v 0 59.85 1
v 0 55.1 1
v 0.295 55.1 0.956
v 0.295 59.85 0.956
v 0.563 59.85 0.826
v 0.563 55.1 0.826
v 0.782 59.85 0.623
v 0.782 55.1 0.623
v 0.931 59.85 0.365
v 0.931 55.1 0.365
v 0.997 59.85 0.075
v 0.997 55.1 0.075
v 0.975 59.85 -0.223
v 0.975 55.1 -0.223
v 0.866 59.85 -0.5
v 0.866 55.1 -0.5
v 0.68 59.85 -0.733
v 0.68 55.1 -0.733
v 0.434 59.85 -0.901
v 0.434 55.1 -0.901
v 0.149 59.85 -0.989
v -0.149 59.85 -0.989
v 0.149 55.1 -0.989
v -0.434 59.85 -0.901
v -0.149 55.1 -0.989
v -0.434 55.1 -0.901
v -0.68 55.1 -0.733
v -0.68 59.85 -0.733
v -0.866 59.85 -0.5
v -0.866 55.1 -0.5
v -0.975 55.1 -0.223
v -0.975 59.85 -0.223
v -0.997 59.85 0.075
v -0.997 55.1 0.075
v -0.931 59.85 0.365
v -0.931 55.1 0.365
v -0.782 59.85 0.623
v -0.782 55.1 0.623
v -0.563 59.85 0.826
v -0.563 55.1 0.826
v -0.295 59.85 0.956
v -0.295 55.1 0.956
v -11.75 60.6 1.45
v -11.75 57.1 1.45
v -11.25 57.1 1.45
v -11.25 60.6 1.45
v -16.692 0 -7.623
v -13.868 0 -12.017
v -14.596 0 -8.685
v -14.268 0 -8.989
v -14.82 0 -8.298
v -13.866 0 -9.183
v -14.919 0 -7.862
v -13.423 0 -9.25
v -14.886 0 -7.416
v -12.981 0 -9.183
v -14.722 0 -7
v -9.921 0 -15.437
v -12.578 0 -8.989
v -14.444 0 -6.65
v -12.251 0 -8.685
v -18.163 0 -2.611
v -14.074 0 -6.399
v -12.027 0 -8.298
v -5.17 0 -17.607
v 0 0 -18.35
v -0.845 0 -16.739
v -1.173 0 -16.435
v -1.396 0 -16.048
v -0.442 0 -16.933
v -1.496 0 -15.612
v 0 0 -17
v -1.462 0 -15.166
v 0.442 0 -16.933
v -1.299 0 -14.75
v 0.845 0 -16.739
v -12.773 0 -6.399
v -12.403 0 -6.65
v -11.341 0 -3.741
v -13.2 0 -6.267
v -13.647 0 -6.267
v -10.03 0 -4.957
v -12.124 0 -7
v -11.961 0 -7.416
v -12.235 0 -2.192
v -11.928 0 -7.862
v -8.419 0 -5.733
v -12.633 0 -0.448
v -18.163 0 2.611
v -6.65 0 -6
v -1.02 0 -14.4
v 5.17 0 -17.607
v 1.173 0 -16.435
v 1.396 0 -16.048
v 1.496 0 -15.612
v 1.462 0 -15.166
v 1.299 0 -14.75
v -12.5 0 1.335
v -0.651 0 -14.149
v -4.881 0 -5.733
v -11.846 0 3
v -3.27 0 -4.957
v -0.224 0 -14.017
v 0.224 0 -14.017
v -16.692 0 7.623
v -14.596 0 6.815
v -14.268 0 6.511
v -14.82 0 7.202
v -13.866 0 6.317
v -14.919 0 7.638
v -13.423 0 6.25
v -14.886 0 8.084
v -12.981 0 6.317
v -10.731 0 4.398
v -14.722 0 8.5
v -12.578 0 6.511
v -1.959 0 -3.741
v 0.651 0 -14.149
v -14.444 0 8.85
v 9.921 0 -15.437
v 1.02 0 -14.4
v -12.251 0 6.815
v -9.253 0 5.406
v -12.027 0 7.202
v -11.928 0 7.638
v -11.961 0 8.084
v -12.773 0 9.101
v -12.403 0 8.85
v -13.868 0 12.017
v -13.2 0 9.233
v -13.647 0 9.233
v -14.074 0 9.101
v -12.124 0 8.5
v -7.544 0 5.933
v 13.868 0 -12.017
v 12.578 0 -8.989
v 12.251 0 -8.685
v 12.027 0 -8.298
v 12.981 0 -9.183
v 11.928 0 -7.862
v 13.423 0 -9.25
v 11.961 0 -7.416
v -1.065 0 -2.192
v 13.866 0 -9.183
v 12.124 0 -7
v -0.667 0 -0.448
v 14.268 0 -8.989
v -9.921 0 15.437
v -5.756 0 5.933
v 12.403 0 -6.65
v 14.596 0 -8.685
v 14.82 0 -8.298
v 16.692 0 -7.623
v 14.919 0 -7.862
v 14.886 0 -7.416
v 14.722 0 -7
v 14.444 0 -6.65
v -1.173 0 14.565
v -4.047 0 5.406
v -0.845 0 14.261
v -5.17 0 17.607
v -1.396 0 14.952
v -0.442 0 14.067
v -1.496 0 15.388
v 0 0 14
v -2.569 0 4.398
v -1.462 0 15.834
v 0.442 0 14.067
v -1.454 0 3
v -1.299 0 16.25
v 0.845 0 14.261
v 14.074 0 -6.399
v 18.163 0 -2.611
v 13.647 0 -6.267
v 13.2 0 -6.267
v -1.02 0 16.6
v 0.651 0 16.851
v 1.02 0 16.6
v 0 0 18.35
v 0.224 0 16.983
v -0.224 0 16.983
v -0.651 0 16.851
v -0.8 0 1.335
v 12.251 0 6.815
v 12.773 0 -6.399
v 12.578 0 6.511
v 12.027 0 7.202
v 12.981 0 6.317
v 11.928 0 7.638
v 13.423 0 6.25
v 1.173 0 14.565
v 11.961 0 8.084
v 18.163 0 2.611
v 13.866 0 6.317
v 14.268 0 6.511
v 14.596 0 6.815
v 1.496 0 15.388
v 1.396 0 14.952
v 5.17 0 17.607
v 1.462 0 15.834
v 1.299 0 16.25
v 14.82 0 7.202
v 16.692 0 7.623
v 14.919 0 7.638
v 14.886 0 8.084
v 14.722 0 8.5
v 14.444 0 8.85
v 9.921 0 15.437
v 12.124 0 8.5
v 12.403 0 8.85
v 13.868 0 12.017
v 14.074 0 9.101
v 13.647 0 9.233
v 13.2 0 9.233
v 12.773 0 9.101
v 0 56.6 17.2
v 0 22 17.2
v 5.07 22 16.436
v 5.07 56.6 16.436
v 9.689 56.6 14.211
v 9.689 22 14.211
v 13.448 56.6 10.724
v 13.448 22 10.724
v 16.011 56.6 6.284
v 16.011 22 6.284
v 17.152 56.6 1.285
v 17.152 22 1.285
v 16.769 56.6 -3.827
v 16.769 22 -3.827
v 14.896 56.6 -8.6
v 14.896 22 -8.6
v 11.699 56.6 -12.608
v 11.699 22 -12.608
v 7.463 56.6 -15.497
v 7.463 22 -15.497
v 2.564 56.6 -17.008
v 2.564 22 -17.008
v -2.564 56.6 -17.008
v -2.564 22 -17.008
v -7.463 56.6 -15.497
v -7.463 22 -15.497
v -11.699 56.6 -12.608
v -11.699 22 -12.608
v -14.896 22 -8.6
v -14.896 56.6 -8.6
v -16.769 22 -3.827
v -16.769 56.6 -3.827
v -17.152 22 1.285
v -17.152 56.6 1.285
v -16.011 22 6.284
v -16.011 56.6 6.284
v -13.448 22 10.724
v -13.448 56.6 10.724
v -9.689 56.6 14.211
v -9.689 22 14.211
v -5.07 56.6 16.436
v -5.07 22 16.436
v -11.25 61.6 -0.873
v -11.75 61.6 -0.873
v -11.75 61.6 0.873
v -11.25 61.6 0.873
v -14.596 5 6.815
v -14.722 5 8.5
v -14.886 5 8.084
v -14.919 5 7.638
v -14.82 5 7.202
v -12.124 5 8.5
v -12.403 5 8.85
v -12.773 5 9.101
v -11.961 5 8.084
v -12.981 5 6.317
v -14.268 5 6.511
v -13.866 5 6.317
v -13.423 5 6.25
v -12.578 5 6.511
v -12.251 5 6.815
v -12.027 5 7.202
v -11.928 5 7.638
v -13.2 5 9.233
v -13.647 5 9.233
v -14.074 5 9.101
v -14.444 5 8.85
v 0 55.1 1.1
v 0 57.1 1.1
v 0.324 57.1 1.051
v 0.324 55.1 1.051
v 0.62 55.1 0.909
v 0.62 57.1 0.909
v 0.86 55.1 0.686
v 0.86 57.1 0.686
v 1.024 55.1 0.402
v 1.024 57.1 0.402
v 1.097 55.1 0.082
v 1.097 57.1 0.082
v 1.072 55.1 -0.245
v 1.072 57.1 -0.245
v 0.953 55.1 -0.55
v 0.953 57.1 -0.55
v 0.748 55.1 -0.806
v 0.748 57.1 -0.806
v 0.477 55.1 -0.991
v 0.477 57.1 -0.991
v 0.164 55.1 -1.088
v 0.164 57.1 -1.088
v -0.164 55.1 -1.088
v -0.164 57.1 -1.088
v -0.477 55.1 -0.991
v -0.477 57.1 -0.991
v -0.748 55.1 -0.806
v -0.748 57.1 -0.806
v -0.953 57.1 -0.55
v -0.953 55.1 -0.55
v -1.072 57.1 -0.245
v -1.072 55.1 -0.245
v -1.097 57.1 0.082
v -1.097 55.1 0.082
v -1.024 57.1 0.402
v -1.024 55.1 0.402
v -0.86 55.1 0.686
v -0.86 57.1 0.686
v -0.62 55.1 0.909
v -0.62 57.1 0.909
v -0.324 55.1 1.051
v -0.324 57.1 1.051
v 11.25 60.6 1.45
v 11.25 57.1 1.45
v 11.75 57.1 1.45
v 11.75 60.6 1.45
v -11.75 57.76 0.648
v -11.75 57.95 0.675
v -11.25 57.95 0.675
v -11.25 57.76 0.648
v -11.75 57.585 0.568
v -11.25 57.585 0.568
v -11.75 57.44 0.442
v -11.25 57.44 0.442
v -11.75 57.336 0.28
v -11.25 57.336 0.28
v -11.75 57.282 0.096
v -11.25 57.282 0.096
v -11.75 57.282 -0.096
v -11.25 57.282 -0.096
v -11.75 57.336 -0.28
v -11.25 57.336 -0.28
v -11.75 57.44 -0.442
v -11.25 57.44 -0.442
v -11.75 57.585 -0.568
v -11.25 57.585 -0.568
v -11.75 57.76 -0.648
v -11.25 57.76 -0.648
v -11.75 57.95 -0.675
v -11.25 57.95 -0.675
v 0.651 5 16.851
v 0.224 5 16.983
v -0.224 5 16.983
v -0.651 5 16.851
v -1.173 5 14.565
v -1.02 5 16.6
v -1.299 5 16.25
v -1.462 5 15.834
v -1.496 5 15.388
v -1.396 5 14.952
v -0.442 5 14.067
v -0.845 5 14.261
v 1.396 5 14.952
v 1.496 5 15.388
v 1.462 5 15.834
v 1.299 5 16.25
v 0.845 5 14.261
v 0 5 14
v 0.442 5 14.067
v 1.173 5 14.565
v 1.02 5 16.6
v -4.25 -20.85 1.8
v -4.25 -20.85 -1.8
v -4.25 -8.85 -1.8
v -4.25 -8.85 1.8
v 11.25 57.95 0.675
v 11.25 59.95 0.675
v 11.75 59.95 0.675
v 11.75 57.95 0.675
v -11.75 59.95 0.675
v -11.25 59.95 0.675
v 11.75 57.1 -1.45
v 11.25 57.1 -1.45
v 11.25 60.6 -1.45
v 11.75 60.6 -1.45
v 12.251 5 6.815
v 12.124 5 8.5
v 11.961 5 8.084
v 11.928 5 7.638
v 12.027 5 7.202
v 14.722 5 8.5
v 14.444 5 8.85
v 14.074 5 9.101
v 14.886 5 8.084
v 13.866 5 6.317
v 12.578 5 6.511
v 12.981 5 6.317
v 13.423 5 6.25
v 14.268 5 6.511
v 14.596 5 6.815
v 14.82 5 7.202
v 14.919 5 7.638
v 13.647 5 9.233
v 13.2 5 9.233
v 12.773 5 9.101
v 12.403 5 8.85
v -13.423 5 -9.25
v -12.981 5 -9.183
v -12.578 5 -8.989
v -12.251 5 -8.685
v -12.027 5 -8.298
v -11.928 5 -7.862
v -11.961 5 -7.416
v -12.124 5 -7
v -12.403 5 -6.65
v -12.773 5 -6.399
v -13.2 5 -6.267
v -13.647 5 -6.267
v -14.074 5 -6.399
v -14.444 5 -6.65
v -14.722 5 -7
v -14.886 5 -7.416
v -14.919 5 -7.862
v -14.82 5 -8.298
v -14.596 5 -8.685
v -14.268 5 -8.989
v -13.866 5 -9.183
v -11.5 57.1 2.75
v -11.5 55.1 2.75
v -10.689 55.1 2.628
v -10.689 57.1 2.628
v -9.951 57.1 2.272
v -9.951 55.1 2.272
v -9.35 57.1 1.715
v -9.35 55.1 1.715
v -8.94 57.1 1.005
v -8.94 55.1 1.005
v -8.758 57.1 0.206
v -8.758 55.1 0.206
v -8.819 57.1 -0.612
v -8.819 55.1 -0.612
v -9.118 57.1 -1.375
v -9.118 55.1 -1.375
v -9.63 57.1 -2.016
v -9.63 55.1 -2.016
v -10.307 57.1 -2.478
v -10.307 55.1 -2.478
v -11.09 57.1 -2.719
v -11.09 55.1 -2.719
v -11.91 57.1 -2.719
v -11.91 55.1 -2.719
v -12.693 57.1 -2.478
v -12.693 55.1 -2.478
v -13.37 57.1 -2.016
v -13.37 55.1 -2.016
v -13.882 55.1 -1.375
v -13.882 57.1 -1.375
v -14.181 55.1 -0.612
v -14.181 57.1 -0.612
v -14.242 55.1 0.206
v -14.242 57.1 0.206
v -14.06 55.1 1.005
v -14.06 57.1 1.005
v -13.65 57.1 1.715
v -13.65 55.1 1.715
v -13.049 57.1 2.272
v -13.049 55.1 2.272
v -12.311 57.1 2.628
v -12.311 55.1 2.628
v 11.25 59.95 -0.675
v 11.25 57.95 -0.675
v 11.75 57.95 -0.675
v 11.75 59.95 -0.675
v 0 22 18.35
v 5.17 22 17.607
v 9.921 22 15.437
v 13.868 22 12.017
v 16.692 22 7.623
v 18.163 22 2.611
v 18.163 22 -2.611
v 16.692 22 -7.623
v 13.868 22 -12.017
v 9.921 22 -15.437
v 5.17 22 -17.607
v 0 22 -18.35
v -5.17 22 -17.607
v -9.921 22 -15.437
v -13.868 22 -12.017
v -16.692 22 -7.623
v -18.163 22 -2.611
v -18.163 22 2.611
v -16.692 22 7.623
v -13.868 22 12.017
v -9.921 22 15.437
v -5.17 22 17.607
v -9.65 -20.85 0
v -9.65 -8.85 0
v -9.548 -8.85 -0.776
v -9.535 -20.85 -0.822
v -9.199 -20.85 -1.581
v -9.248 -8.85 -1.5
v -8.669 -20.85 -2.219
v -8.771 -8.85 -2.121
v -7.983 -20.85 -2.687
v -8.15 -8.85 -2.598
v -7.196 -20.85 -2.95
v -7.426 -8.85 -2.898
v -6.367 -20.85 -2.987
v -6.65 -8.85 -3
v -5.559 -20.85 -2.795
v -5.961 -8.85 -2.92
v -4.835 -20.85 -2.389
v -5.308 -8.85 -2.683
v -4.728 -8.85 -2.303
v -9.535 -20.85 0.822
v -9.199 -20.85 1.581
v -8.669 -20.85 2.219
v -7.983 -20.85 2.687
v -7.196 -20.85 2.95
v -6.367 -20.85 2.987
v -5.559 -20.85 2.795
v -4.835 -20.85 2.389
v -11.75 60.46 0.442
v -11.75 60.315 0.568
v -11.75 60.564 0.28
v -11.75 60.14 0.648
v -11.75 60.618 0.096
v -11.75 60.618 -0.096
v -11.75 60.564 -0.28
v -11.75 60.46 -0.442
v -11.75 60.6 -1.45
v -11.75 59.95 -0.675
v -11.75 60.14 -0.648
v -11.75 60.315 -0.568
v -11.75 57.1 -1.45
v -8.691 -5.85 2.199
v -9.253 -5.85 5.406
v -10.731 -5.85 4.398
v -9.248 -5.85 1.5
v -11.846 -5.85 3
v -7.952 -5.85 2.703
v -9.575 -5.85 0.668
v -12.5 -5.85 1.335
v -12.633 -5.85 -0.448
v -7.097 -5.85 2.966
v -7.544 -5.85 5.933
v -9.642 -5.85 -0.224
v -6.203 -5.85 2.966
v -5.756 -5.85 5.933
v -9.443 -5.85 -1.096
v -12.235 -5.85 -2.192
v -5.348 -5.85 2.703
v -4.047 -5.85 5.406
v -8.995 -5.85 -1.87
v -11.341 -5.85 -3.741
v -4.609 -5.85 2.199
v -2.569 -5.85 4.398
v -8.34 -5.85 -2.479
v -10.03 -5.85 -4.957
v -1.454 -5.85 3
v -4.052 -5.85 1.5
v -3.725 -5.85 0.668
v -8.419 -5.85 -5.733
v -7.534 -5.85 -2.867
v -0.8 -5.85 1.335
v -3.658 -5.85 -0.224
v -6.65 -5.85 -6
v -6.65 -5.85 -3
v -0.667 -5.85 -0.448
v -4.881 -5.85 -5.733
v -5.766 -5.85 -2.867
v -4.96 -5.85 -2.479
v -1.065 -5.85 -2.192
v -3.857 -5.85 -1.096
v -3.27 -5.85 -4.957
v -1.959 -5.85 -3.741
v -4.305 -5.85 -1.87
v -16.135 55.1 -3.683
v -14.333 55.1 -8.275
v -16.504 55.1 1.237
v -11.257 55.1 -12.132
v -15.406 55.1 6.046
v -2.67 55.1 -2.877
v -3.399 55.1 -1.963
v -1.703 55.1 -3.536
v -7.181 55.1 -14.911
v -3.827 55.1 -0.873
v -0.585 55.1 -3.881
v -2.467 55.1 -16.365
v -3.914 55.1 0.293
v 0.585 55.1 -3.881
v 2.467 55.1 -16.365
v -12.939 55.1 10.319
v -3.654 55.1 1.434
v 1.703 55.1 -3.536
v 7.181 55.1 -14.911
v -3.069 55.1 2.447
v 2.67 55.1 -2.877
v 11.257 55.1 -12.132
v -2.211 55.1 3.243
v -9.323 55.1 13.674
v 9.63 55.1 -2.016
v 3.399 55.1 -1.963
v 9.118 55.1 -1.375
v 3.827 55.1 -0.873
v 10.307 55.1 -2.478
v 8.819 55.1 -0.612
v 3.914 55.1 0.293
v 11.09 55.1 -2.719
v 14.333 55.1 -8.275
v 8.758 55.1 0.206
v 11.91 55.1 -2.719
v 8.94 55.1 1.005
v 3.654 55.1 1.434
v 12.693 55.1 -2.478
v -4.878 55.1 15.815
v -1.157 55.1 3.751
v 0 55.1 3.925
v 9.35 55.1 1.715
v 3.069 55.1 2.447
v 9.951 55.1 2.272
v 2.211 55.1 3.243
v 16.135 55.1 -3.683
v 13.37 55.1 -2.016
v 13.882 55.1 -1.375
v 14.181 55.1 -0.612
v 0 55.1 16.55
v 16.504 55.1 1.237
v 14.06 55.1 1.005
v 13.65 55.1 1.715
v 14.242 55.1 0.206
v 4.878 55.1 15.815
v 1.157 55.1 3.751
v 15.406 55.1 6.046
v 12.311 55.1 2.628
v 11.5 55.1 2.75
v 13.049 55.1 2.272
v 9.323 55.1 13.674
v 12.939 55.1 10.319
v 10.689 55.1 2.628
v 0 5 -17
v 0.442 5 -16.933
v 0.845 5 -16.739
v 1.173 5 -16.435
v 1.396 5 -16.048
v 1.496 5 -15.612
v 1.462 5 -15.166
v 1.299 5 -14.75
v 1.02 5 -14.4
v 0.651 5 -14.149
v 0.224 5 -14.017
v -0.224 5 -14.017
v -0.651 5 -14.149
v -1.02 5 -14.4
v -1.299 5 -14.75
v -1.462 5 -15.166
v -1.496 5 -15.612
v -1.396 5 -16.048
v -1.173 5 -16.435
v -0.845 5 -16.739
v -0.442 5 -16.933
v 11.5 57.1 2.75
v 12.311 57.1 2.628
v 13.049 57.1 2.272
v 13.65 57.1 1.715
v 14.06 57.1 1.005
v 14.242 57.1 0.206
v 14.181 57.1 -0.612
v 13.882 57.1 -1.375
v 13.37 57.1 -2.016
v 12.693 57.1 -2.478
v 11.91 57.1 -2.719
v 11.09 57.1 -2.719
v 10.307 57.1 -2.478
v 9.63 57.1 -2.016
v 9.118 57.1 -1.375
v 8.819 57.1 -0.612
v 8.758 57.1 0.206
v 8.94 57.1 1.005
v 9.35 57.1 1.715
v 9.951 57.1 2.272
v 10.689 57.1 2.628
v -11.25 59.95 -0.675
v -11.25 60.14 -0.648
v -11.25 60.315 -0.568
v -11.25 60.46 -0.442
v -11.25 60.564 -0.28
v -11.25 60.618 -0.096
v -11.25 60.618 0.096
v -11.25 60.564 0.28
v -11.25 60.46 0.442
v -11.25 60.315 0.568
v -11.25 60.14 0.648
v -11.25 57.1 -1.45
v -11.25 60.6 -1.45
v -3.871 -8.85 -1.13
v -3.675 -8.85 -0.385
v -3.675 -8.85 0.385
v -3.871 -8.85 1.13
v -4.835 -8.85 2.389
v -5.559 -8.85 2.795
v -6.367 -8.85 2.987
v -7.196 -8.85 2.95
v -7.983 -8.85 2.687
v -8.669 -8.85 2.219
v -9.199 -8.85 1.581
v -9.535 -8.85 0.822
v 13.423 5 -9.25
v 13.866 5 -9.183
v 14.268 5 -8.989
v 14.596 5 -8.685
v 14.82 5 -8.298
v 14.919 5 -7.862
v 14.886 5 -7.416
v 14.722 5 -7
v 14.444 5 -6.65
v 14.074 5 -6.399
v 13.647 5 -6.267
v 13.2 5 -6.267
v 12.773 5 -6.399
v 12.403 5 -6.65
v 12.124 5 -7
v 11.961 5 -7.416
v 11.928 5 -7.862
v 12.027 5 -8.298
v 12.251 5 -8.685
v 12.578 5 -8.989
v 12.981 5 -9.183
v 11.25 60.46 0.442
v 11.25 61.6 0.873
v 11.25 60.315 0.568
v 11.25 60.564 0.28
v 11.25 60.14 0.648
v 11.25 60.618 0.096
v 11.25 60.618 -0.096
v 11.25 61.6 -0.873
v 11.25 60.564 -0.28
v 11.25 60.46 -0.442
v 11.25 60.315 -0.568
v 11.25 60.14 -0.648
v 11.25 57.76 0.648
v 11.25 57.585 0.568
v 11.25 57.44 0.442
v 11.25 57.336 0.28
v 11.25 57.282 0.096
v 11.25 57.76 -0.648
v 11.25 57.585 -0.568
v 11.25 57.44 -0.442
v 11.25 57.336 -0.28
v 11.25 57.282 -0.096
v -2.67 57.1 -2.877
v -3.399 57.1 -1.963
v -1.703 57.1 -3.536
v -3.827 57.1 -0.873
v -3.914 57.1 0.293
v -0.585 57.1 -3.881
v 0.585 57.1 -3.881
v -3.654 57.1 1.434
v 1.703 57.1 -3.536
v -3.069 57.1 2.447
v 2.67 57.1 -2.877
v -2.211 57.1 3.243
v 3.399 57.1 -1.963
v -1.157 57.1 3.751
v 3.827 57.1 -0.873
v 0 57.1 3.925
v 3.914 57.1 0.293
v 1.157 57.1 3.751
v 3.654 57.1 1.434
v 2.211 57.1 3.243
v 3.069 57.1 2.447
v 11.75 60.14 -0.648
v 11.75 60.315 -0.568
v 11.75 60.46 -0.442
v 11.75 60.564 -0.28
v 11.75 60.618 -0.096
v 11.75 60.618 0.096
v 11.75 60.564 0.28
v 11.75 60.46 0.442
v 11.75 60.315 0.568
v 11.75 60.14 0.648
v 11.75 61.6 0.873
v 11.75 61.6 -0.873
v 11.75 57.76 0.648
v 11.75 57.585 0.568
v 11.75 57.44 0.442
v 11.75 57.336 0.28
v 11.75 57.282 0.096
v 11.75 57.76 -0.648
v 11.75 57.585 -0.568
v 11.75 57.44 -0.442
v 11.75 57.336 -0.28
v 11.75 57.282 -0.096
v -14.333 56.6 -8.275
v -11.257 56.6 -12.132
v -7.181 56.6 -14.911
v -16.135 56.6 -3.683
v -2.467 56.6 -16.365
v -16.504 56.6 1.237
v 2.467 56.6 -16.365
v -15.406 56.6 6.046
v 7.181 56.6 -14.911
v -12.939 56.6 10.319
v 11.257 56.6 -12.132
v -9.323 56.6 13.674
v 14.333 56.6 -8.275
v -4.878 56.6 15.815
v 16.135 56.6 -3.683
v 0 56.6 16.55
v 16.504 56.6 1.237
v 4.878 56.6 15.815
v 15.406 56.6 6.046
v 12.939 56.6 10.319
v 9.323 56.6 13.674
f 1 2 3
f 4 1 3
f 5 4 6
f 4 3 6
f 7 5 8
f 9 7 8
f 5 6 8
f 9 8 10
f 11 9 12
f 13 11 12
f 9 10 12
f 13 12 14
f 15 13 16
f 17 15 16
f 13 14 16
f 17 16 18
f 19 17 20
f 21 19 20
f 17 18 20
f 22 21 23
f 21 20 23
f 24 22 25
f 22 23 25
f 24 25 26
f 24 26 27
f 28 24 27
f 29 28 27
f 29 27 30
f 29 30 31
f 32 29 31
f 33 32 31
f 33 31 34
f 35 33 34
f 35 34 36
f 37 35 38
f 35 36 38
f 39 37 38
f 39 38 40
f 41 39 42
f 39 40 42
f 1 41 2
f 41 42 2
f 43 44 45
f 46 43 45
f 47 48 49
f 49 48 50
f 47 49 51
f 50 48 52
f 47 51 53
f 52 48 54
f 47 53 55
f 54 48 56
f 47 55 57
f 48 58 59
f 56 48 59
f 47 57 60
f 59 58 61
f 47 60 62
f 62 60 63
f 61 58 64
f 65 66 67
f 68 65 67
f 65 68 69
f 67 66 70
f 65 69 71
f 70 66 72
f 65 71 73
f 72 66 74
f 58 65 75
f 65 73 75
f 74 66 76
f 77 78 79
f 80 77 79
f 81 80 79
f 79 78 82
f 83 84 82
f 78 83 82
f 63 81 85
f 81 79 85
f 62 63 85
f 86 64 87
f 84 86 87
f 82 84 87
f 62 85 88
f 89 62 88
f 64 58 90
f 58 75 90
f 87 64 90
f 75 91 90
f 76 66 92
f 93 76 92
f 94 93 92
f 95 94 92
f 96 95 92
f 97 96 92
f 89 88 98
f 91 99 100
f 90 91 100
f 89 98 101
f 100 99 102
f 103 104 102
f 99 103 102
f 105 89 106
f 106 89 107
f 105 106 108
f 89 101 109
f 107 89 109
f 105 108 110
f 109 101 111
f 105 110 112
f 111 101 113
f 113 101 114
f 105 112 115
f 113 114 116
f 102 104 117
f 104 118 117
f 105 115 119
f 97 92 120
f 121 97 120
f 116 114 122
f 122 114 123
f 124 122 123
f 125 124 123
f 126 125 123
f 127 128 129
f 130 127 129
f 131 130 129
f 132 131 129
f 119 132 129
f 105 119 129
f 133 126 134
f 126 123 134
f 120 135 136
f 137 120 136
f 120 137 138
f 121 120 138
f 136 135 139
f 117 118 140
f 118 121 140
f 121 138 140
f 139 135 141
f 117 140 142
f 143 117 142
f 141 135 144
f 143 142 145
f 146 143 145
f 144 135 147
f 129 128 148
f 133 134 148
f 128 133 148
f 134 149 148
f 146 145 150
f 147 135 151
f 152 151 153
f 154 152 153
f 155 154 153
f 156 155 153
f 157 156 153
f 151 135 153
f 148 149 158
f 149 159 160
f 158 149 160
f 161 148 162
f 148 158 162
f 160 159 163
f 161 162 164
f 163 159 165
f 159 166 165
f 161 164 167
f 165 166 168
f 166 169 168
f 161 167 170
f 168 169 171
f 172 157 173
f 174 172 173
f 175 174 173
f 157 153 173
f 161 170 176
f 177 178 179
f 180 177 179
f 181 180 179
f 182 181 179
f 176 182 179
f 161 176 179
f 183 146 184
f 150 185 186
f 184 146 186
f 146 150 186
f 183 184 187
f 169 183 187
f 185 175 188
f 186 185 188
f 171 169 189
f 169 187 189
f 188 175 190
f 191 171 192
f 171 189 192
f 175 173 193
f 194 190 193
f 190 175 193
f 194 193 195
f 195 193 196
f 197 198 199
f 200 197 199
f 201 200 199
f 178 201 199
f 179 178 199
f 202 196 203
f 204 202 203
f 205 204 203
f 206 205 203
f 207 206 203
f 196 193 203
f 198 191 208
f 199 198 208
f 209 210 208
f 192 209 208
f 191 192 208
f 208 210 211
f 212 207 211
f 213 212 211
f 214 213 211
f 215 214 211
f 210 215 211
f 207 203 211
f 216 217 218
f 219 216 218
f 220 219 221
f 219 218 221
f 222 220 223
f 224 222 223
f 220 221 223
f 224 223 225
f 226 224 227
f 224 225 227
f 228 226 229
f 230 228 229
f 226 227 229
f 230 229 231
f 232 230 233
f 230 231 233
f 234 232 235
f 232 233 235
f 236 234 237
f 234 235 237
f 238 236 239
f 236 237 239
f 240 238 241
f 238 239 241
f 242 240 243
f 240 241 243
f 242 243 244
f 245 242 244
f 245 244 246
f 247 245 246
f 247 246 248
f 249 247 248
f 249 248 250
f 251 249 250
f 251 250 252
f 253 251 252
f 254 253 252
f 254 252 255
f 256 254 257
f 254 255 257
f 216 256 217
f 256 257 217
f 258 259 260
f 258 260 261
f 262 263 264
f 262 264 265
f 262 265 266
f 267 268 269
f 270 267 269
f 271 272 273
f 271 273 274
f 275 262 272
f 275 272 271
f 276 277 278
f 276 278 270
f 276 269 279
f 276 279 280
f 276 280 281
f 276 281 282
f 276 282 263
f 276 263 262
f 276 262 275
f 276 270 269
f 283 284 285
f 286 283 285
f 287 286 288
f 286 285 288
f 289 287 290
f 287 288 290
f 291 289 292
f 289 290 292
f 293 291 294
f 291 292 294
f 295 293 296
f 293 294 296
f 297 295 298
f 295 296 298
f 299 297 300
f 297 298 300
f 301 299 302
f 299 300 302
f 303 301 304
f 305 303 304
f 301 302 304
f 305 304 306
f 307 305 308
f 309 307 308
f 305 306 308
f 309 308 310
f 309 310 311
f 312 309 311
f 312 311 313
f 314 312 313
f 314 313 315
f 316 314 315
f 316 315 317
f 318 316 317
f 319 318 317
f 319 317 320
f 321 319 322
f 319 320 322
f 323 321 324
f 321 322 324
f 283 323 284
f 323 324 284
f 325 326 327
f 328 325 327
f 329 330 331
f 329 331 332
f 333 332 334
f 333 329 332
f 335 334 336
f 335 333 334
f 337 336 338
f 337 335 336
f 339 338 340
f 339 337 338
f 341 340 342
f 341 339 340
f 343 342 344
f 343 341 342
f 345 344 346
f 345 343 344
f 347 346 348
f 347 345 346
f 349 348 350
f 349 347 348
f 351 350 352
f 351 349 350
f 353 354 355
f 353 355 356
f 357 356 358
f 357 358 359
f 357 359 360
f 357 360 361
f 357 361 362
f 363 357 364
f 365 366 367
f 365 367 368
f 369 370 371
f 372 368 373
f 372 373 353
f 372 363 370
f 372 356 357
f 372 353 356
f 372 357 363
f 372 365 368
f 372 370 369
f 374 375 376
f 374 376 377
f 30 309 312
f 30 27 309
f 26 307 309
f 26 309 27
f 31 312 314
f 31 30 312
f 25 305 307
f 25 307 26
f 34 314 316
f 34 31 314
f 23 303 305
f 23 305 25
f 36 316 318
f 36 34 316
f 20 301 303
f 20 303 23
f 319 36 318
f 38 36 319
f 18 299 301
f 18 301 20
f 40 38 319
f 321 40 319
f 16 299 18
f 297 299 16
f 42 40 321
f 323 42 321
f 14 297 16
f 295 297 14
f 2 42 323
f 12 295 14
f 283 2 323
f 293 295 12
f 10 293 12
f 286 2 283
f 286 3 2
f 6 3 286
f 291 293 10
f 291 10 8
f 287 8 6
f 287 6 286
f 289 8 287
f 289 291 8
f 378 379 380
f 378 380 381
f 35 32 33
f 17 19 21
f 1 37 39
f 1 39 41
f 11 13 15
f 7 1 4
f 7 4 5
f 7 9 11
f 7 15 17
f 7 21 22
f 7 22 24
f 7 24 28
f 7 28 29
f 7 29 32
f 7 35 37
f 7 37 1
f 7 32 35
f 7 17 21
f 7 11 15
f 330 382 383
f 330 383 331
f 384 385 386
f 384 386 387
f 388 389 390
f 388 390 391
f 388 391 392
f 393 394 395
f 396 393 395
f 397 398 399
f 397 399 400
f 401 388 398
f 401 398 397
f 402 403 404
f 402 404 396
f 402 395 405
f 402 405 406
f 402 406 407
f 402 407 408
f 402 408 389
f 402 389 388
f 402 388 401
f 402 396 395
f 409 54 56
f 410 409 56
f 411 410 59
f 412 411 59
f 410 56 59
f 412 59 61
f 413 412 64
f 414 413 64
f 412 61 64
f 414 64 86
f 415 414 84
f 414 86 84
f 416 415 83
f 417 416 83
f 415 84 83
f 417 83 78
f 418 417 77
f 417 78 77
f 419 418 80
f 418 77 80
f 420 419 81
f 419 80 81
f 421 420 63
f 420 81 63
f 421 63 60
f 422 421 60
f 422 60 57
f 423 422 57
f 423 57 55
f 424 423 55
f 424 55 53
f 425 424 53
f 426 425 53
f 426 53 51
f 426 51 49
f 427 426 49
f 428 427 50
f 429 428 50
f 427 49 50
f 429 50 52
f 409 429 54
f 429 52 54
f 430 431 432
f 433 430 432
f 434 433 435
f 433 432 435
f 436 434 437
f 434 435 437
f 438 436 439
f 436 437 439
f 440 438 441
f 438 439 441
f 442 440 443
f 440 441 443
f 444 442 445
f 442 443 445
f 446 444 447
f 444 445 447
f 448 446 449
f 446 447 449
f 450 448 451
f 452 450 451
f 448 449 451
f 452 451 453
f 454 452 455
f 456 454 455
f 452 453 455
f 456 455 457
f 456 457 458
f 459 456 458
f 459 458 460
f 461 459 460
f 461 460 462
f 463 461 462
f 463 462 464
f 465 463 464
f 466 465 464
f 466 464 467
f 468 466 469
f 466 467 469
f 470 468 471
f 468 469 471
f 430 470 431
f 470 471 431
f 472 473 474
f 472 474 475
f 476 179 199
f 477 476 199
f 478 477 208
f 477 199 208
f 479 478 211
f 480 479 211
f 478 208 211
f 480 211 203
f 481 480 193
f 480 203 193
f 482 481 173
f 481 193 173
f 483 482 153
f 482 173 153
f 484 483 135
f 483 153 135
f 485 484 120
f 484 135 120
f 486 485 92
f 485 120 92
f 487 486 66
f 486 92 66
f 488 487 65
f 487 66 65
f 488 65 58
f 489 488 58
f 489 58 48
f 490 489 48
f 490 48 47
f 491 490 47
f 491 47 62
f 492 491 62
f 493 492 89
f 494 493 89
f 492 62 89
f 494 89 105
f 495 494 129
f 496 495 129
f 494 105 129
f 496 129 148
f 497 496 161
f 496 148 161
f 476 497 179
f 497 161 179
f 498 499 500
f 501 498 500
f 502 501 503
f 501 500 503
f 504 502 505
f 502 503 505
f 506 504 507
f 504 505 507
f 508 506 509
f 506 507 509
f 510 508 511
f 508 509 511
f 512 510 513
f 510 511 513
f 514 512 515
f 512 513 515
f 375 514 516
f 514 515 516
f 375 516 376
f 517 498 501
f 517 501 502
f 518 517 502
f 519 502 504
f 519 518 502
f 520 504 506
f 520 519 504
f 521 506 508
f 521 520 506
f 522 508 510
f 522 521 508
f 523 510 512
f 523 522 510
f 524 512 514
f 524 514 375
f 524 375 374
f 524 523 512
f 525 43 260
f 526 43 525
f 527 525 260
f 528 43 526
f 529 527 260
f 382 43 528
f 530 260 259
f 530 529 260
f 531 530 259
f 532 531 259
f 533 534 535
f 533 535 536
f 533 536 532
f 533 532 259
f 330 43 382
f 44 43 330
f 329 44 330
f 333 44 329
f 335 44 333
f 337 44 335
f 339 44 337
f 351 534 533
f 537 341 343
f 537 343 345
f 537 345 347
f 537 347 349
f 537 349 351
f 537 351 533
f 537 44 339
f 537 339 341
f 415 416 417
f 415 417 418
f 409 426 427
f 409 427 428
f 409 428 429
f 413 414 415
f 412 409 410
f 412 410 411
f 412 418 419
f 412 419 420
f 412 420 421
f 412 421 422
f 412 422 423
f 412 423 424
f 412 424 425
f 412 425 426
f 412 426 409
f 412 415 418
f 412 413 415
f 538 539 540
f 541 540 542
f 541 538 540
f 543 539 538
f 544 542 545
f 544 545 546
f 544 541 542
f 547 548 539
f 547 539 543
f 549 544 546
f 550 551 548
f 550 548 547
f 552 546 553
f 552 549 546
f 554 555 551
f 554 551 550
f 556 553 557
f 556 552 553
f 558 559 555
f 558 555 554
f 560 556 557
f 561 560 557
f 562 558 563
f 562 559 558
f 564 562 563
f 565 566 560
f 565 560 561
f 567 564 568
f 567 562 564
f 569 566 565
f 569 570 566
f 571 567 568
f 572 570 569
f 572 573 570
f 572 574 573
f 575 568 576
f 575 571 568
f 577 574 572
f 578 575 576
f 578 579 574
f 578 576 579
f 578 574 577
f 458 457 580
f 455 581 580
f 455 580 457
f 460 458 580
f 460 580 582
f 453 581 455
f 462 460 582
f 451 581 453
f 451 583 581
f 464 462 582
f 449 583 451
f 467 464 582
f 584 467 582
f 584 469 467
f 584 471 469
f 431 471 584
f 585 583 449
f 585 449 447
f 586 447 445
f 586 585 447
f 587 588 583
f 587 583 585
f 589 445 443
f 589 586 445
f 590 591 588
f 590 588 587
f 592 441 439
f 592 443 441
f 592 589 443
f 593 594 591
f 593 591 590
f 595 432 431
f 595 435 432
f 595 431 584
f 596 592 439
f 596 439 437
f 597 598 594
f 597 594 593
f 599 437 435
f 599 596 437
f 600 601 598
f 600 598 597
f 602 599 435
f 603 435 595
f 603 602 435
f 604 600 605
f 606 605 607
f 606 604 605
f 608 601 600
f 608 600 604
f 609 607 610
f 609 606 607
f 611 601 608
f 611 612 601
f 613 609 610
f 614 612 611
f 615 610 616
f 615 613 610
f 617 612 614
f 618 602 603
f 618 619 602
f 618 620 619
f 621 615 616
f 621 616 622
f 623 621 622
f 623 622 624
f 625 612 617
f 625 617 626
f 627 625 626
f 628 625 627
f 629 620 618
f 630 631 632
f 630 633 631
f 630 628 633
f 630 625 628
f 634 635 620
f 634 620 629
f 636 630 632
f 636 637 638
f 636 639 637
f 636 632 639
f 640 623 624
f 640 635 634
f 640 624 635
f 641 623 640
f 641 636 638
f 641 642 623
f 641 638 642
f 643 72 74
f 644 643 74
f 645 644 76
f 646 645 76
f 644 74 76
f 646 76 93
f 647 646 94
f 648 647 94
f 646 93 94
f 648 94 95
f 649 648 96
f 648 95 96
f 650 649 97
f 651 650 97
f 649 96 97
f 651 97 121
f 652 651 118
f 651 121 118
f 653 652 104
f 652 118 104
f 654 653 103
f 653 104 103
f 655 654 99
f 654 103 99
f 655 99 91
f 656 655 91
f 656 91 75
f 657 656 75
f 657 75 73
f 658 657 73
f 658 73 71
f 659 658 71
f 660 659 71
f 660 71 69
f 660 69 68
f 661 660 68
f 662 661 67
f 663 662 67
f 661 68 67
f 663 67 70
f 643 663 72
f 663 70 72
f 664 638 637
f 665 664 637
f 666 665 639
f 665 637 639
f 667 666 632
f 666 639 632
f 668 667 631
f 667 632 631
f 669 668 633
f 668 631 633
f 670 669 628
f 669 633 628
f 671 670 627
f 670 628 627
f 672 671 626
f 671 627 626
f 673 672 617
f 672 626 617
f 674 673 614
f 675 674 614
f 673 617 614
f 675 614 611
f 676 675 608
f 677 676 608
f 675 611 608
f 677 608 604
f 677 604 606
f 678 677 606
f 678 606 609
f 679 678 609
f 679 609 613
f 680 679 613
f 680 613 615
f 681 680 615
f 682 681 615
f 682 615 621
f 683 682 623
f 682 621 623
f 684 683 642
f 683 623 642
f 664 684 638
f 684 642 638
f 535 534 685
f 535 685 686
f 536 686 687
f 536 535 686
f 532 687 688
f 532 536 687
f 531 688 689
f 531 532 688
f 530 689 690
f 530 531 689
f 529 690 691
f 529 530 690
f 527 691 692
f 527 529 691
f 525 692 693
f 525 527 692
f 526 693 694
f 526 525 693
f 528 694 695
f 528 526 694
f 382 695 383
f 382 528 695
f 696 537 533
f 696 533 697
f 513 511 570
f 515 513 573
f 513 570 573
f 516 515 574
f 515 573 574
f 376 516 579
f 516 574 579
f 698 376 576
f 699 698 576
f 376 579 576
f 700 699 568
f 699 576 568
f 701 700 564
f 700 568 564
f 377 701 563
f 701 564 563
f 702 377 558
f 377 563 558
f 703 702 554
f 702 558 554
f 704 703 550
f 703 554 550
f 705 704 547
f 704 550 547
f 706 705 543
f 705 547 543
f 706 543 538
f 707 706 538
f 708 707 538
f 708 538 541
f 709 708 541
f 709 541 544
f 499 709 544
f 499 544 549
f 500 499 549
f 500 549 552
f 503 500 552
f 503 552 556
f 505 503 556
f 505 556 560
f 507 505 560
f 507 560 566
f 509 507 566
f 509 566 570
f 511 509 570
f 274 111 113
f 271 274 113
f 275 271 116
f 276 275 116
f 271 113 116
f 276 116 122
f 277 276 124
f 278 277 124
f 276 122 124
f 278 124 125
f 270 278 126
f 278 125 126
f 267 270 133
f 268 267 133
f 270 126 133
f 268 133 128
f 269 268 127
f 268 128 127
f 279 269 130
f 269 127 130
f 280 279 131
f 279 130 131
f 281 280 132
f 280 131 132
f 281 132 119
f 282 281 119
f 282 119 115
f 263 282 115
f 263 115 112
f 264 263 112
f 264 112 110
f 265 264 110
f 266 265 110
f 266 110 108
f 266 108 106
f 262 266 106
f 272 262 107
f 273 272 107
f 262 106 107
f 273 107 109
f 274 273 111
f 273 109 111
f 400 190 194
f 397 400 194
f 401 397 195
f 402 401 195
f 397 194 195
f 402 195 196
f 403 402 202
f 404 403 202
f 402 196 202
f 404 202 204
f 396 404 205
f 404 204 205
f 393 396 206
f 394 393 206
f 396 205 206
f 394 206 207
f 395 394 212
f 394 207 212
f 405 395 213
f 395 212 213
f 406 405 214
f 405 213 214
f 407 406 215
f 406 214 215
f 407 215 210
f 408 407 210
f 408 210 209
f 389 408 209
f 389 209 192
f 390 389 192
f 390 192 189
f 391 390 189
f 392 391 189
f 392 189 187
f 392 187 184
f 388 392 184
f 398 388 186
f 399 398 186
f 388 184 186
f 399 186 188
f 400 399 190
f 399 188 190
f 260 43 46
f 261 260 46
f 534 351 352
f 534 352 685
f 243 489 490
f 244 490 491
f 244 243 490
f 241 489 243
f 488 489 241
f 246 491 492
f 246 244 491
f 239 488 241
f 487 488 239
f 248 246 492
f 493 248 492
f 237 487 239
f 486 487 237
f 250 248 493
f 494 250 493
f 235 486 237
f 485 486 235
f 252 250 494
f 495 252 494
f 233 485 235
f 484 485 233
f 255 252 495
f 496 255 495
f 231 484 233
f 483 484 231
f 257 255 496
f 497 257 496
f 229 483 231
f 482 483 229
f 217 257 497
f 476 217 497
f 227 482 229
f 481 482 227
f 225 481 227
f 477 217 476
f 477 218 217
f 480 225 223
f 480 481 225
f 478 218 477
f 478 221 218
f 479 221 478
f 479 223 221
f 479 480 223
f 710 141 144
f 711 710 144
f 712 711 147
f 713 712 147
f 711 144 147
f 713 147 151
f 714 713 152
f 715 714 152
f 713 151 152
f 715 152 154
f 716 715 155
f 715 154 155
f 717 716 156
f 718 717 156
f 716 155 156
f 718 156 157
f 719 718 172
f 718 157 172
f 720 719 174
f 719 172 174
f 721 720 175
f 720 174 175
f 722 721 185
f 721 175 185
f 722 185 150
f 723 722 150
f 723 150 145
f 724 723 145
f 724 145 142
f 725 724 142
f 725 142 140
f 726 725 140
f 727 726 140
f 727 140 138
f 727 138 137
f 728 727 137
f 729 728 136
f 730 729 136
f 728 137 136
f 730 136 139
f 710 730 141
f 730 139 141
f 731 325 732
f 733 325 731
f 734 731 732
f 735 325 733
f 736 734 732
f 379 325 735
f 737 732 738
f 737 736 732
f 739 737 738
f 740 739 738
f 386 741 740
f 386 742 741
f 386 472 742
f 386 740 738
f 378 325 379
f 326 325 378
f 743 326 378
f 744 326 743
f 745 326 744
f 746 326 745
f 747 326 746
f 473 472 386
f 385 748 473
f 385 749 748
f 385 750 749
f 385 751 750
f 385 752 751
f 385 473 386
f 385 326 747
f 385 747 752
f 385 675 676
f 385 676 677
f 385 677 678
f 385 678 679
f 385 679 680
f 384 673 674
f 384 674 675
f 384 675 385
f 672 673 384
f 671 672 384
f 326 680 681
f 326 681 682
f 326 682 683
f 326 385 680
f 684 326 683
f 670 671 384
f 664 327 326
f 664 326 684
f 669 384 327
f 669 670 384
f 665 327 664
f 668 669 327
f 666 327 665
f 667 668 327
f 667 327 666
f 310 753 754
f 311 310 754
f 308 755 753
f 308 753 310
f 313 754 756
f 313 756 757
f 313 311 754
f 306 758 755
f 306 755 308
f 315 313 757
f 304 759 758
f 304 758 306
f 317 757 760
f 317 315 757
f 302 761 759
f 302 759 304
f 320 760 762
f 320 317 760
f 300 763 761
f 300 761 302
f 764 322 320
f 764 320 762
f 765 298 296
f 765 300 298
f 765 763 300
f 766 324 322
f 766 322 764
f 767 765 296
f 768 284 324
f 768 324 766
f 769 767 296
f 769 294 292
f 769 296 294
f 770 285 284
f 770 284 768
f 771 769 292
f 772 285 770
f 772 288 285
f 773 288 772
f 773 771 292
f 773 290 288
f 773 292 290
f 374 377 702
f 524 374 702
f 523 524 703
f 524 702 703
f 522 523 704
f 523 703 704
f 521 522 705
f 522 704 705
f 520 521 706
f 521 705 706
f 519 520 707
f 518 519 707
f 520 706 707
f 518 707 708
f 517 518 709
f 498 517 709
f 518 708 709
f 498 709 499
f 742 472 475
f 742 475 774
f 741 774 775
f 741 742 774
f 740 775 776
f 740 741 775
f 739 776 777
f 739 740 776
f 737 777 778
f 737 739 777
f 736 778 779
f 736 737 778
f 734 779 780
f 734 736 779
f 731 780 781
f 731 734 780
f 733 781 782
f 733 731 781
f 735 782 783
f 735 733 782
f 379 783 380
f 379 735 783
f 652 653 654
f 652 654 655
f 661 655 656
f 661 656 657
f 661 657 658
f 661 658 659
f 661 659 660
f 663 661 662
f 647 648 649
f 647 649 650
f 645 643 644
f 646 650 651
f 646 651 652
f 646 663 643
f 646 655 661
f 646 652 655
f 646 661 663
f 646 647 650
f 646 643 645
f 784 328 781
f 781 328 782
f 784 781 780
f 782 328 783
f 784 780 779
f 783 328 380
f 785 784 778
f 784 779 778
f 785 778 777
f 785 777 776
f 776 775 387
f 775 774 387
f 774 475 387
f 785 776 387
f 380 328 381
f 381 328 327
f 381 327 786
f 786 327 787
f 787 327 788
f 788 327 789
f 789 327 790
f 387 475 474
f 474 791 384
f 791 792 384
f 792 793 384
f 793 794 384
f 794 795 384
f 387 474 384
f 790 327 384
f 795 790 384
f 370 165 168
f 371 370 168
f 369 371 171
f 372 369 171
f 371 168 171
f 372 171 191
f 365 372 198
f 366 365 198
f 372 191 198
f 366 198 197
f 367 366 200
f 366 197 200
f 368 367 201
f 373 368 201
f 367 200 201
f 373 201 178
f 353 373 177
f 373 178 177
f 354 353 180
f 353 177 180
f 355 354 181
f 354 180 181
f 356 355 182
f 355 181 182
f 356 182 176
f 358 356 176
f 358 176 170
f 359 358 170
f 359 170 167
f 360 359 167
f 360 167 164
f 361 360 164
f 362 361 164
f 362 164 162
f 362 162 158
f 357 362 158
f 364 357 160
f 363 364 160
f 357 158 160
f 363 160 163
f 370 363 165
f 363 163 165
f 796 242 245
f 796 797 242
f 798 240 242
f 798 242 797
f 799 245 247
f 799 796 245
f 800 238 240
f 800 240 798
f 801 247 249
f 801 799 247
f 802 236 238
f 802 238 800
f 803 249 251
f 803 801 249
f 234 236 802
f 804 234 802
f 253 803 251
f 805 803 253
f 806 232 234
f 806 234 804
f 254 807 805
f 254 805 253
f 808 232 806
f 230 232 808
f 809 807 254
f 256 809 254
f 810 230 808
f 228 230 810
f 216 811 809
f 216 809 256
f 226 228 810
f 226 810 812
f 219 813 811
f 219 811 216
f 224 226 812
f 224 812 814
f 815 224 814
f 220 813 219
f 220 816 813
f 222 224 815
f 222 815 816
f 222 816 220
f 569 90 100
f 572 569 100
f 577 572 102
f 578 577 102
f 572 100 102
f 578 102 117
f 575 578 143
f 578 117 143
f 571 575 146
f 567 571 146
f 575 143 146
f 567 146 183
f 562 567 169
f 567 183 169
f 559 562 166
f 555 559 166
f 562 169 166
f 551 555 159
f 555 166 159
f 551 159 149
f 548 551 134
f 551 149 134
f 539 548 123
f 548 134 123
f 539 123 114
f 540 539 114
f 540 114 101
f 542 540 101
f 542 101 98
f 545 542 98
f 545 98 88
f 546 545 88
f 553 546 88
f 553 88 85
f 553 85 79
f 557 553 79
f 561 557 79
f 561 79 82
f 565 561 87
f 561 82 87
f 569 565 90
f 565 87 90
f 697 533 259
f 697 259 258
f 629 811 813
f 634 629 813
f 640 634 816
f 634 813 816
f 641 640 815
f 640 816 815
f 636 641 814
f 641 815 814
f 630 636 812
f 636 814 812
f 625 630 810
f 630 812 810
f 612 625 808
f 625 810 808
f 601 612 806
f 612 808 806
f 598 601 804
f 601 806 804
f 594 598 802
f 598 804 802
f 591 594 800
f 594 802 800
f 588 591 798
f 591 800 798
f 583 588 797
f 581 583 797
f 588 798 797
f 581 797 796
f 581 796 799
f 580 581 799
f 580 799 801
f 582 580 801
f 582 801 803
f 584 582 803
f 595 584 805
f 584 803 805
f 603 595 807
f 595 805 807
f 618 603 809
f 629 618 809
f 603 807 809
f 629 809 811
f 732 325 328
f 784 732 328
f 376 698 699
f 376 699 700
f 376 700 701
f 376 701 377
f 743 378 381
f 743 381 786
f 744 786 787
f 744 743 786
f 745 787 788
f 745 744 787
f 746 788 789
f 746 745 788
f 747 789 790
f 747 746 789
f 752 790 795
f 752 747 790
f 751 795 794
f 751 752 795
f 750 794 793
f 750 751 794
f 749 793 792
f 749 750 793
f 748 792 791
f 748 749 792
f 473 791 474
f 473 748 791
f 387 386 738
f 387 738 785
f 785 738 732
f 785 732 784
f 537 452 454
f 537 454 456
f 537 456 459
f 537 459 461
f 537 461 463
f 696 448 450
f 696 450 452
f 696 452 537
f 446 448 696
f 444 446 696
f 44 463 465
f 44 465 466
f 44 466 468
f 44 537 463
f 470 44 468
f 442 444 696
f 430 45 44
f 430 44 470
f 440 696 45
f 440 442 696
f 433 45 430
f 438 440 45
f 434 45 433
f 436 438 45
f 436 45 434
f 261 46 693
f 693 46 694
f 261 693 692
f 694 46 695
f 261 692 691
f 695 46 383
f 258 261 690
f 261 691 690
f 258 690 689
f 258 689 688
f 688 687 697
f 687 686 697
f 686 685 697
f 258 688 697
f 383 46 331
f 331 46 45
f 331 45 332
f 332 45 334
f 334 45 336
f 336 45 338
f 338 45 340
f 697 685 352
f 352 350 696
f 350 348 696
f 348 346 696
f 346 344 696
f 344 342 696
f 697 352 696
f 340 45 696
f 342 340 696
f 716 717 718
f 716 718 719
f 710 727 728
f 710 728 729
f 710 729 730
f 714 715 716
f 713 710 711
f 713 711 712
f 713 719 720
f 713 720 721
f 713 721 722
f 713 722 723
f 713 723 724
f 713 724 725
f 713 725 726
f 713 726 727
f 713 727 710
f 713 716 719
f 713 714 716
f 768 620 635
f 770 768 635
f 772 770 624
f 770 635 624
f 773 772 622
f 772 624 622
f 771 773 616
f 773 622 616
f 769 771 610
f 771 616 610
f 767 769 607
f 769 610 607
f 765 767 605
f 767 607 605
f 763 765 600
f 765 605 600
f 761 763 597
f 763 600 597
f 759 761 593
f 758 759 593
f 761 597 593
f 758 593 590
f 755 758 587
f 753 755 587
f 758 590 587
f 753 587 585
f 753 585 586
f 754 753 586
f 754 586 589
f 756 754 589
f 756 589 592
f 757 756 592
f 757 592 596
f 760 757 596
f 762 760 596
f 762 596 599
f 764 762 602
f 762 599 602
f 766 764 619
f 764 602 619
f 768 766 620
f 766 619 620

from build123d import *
from OCP.BRepFilletAPI import BRepFilletAPI_MakeChamfer

# Parameters (mm, degrees)
SCHIZZO1_R                   = 18.35
ESTRUSIONE_ESTRUSIONE1_DEPTH = 22
SCHIZZO2_R                   = 17.2
ESTRUSIONE_ESTRUSIONE2_DEPTH = 34.6
SCHIZZO3_R                   = 16.55
TAGLIO_ESTRUSIONE1_DEPTH     = 1.5
SCHIZZO4_R                   = 2.75
SCHIZZO4_R_2                 = 3.925
ESTRUSIONE_ESTRUSIONE3_DEPTH = 2
SCHIZZO5_W                   = 0.5
SCHIZZO5_H                   = 2.9
ESTRUSIONE_ESTRUSIONE4_DEPTH = 4.5
SMUSSO1_SIZE                 = 1
SMUSSO1_SIZE2                = 0.577350269
TAGLIO_ESTRUSIONE2_DEPTH     = 71.973886043
SCHIZZO7_R                   = 1.1
TAGLIO_ESTRUSIONE3_DEPTH     = 2
SCHIZZO8_R                   = 1
ESTRUSIONE_ESTRUSIONE5_DEPTH = 4.75
SCHIZZO9_R                   = 1.5
TAGLIO_ESTRUSIONE4_DEPTH     = 5
SCHIZZO10_R                  = 6
ESTRUSIONE_ESTRUSIONE6_DEPTH = 5.85
SCHIZZO11_R                  = 3
ESTRUSIONE_ESTRUSIONE7_DEPTH = 3
ESTRUSIONE_ESTRUSIONE8_DEPTH = 12


with BuildPart() as part:
    # Schizzo1 → Estrusione-Estrusione1 (new body)
    with BuildSketch(Plane(origin=(0, 0, 0), x_dir=(1, 0, 0), z_dir=(0, 1, 0))):
        with Locations(Location((0, 0, 0), (0, 0, 270))):
            Circle(SCHIZZO1_R)
    extrude(amount=ESTRUSIONE_ESTRUSIONE1_DEPTH)

    # Schizzo2 → Estrusione-Estrusione2 (add)
    with BuildSketch(Plane(origin=(0, 22, 0), x_dir=(1, 0, 0), z_dir=(0, 1, 0))):
        with Locations(Location((0, 0, 0), (0, 0, 270))):
            Circle(SCHIZZO2_R)
    extrude(amount=ESTRUSIONE_ESTRUSIONE2_DEPTH)

    # Schizzo3 → Taglio-Estrusione1 (cut)
    with BuildSketch(Plane(origin=(0, 56.6, 0), x_dir=(1, 0, 0), z_dir=(0, 1, 0))):
        with Locations(Location((0, 0, 0), (0, 0, 270))):
            Circle(SCHIZZO3_R)
    extrude(amount=-TAGLIO_ESTRUSIONE1_DEPTH, mode=Mode.SUBTRACT)

    # Schizzo4 → Estrusione-Estrusione3 (add)
    with BuildSketch(Plane(origin=(0, 55.1, 0), x_dir=(1, 0, 0), z_dir=(0, 1, 0))):
        with Locations(Location((11.5, 0, 0), (0, 0, 270))):
            Circle(SCHIZZO4_R)
        with Locations(Location((-11.5, 0, 0), (0, 0, 270))):
            Circle(SCHIZZO4_R)
        with Locations(Location((0, 0, 0), (0, 0, 270))):
            Circle(SCHIZZO4_R_2)
    extrude(amount=ESTRUSIONE_ESTRUSIONE3_DEPTH)

    # Schizzo5 → Estrusione-Estrusione4 (add)
    with BuildSketch(Plane(origin=(0, 57.1, 0), x_dir=(1, 0, 0), z_dir=(0, 1, 0))):
        with Locations((-11.5, 0)):
            Rectangle(SCHIZZO5_W, SCHIZZO5_H)
        with Locations((11.5, 0)):
            Rectangle(SCHIZZO5_W, SCHIZZO5_H)
    extrude(amount=ESTRUSIONE_ESTRUSIONE4_DEPTH)

    # Smusso1: one chamfer whose edges measure the first distance from different faces: ONE call of the kernel's chamfer builder (chamfer() names one face for all edges)
    smusso1_edges_1 = [part.edges().sort_by_distance(p)[0] for p in [
        (-11.5, 61.6, -1.45),
    ]]
    smusso1_side_1 = [part.faces().sort_by_distance(p)[0] for p in [
        (-11.5, 59.35, -1.45),
    ]]
    smusso1_edges_2 = [part.edges().sort_by_distance(p)[0] for p in [
        (-11.5, 61.6, 1.45),
    ]]
    smusso1_side_2 = [part.faces().sort_by_distance(p)[0] for p in [
        (-11.5, 59.35, 1.45),
    ]]
    smusso1_edges_3 = [part.edges().sort_by_distance(p)[0] for p in [
        (11.5, 61.6, -1.45),
    ]]
    smusso1_side_3 = [part.faces().sort_by_distance(p)[0] for p in [
        (11.5, 59.35, -1.45),
    ]]
    smusso1_edges_4 = [part.edges().sort_by_distance(p)[0] for p in [
        (11.5, 61.6, 1.45),
    ]]
    smusso1_side_4 = [part.faces().sort_by_distance(p)[0] for p in [
        (11.5, 59.35, 1.45),
    ]]
    smusso1 = BRepFilletAPI_MakeChamfer(part.part.solid().wrapped)
    for e in smusso1_edges_1:
        smusso1.Add(SMUSSO1_SIZE, SMUSSO1_SIZE2, e.wrapped, smusso1_side_1[0].wrapped)  # the first distance lies on this face
    for e in smusso1_edges_2:
        smusso1.Add(SMUSSO1_SIZE, SMUSSO1_SIZE2, e.wrapped, smusso1_side_2[0].wrapped)  # the first distance lies on this face
    for e in smusso1_edges_3:
        smusso1.Add(SMUSSO1_SIZE, SMUSSO1_SIZE2, e.wrapped, smusso1_side_3[0].wrapped)  # the first distance lies on this face
    for e in smusso1_edges_4:
        smusso1.Add(SMUSSO1_SIZE, SMUSSO1_SIZE2, e.wrapped, smusso1_side_4[0].wrapped)  # the first distance lies on this face
    add(Compound.cast(smusso1.Shape()), mode=Mode.REPLACE)

    # Schizzo6 → Taglio-Estrusione2 (cut, through all)
    with BuildSketch(Plane.ZY.offset(11.75)):
        with BuildLine():
            Line((0.675, 59.95), (0.675, 57.95))
            ThreePointArc((0.675, 57.95), (0, 57.275), (-0.675, 57.95))
            Line((-0.675, 57.95), (-0.675, 59.95))
            ThreePointArc((-0.675, 59.95), (0, 60.625), (0.675, 59.95))
        make_face()
    extrude(amount=-TAGLIO_ESTRUSIONE2_DEPTH, mode=Mode.SUBTRACT)

    # Schizzo7 → Taglio-Estrusione3 (cut)
    with BuildSketch(Plane(origin=(0, 57.1, 0), x_dir=(1, 0, 0), z_dir=(0, 1, 0))):
        with Locations(Location((0, 0, 0), (0, 0, 270))):
            Circle(SCHIZZO7_R)
    extrude(amount=-TAGLIO_ESTRUSIONE3_DEPTH, mode=Mode.SUBTRACT)

    # Schizzo8 → Estrusione-Estrusione5 (add)
    with BuildSketch(Plane(origin=(0, 55.1, 0), x_dir=(1, 0, 0), z_dir=(0, 1, 0))):
        with Locations(Location((0, 0, 0), (0, 0, 270))):
            Circle(SCHIZZO8_R)
    extrude(amount=ESTRUSIONE_ESTRUSIONE5_DEPTH)

    # Schizzo9 → Taglio-Estrusione4 (cut)
    with BuildSketch(Plane.XZ):
        with Locations(Location((0, -15.5, 0), (0, 0, 270))):
            Circle(SCHIZZO9_R)
        with Locations(Location((-13.423393759, -7.75, 0), (0, 0, 270))):
            Circle(SCHIZZO9_R)
        with Locations(Location((-13.423393759, 7.75, 0), (0, 0, 270))):
            Circle(SCHIZZO9_R)
        with Locations(Location((0, 15.5, 0), (0, 0, 270))):
            Circle(SCHIZZO9_R)
        with Locations(Location((13.423393759, 7.75, 0), (0, 0, 270))):
            Circle(SCHIZZO9_R)
        with Locations(Location((13.423393759, -7.75, 0), (0, 0, 270))):
            Circle(SCHIZZO9_R)
    extrude(amount=-TAGLIO_ESTRUSIONE4_DEPTH, mode=Mode.SUBTRACT)

    # Schizzo10 → Estrusione-Estrusione6 (add)
    with BuildSketch(Plane.XZ):
        with Locations(Location((-6.65, 0, 0), (0, 0, 270))):
            Circle(SCHIZZO10_R)
    extrude(amount=ESTRUSIONE_ESTRUSIONE6_DEPTH)

    # Schizzo11 → Estrusione-Estrusione7 (add)
    with BuildSketch(Plane.XZ.offset(5.85)):
        with Locations(Location((-6.65, 0, 0), (0, 0, 270))):
            Circle(SCHIZZO11_R)
    extrude(amount=ESTRUSIONE_ESTRUSIONE7_DEPTH)

    # Schizzo12 → Estrusione-Estrusione8 (add)
    with BuildSketch(Plane.XZ.offset(8.85)):
        with BuildLine():
            ThreePointArc((-9.65, 0), (-7.598683298, -2.846049894), (-4.25, -1.8))
            Line((-4.25, -1.8), (-4.25, 0))
            Line((-4.25, 0), (-9.65, 0))
        make_face()
        with BuildLine():
            Line((-9.65, 0), (-4.25, 0))
            Line((-4.25, 0), (-4.25, 1.8))
            ThreePointArc((-4.25, 1.8), (-7.598683298, 2.846049894), (-9.65, 0))
        make_face()
    extrude(amount=ESTRUSIONE_ESTRUSIONE8_DEPTH)


solid = part.part
